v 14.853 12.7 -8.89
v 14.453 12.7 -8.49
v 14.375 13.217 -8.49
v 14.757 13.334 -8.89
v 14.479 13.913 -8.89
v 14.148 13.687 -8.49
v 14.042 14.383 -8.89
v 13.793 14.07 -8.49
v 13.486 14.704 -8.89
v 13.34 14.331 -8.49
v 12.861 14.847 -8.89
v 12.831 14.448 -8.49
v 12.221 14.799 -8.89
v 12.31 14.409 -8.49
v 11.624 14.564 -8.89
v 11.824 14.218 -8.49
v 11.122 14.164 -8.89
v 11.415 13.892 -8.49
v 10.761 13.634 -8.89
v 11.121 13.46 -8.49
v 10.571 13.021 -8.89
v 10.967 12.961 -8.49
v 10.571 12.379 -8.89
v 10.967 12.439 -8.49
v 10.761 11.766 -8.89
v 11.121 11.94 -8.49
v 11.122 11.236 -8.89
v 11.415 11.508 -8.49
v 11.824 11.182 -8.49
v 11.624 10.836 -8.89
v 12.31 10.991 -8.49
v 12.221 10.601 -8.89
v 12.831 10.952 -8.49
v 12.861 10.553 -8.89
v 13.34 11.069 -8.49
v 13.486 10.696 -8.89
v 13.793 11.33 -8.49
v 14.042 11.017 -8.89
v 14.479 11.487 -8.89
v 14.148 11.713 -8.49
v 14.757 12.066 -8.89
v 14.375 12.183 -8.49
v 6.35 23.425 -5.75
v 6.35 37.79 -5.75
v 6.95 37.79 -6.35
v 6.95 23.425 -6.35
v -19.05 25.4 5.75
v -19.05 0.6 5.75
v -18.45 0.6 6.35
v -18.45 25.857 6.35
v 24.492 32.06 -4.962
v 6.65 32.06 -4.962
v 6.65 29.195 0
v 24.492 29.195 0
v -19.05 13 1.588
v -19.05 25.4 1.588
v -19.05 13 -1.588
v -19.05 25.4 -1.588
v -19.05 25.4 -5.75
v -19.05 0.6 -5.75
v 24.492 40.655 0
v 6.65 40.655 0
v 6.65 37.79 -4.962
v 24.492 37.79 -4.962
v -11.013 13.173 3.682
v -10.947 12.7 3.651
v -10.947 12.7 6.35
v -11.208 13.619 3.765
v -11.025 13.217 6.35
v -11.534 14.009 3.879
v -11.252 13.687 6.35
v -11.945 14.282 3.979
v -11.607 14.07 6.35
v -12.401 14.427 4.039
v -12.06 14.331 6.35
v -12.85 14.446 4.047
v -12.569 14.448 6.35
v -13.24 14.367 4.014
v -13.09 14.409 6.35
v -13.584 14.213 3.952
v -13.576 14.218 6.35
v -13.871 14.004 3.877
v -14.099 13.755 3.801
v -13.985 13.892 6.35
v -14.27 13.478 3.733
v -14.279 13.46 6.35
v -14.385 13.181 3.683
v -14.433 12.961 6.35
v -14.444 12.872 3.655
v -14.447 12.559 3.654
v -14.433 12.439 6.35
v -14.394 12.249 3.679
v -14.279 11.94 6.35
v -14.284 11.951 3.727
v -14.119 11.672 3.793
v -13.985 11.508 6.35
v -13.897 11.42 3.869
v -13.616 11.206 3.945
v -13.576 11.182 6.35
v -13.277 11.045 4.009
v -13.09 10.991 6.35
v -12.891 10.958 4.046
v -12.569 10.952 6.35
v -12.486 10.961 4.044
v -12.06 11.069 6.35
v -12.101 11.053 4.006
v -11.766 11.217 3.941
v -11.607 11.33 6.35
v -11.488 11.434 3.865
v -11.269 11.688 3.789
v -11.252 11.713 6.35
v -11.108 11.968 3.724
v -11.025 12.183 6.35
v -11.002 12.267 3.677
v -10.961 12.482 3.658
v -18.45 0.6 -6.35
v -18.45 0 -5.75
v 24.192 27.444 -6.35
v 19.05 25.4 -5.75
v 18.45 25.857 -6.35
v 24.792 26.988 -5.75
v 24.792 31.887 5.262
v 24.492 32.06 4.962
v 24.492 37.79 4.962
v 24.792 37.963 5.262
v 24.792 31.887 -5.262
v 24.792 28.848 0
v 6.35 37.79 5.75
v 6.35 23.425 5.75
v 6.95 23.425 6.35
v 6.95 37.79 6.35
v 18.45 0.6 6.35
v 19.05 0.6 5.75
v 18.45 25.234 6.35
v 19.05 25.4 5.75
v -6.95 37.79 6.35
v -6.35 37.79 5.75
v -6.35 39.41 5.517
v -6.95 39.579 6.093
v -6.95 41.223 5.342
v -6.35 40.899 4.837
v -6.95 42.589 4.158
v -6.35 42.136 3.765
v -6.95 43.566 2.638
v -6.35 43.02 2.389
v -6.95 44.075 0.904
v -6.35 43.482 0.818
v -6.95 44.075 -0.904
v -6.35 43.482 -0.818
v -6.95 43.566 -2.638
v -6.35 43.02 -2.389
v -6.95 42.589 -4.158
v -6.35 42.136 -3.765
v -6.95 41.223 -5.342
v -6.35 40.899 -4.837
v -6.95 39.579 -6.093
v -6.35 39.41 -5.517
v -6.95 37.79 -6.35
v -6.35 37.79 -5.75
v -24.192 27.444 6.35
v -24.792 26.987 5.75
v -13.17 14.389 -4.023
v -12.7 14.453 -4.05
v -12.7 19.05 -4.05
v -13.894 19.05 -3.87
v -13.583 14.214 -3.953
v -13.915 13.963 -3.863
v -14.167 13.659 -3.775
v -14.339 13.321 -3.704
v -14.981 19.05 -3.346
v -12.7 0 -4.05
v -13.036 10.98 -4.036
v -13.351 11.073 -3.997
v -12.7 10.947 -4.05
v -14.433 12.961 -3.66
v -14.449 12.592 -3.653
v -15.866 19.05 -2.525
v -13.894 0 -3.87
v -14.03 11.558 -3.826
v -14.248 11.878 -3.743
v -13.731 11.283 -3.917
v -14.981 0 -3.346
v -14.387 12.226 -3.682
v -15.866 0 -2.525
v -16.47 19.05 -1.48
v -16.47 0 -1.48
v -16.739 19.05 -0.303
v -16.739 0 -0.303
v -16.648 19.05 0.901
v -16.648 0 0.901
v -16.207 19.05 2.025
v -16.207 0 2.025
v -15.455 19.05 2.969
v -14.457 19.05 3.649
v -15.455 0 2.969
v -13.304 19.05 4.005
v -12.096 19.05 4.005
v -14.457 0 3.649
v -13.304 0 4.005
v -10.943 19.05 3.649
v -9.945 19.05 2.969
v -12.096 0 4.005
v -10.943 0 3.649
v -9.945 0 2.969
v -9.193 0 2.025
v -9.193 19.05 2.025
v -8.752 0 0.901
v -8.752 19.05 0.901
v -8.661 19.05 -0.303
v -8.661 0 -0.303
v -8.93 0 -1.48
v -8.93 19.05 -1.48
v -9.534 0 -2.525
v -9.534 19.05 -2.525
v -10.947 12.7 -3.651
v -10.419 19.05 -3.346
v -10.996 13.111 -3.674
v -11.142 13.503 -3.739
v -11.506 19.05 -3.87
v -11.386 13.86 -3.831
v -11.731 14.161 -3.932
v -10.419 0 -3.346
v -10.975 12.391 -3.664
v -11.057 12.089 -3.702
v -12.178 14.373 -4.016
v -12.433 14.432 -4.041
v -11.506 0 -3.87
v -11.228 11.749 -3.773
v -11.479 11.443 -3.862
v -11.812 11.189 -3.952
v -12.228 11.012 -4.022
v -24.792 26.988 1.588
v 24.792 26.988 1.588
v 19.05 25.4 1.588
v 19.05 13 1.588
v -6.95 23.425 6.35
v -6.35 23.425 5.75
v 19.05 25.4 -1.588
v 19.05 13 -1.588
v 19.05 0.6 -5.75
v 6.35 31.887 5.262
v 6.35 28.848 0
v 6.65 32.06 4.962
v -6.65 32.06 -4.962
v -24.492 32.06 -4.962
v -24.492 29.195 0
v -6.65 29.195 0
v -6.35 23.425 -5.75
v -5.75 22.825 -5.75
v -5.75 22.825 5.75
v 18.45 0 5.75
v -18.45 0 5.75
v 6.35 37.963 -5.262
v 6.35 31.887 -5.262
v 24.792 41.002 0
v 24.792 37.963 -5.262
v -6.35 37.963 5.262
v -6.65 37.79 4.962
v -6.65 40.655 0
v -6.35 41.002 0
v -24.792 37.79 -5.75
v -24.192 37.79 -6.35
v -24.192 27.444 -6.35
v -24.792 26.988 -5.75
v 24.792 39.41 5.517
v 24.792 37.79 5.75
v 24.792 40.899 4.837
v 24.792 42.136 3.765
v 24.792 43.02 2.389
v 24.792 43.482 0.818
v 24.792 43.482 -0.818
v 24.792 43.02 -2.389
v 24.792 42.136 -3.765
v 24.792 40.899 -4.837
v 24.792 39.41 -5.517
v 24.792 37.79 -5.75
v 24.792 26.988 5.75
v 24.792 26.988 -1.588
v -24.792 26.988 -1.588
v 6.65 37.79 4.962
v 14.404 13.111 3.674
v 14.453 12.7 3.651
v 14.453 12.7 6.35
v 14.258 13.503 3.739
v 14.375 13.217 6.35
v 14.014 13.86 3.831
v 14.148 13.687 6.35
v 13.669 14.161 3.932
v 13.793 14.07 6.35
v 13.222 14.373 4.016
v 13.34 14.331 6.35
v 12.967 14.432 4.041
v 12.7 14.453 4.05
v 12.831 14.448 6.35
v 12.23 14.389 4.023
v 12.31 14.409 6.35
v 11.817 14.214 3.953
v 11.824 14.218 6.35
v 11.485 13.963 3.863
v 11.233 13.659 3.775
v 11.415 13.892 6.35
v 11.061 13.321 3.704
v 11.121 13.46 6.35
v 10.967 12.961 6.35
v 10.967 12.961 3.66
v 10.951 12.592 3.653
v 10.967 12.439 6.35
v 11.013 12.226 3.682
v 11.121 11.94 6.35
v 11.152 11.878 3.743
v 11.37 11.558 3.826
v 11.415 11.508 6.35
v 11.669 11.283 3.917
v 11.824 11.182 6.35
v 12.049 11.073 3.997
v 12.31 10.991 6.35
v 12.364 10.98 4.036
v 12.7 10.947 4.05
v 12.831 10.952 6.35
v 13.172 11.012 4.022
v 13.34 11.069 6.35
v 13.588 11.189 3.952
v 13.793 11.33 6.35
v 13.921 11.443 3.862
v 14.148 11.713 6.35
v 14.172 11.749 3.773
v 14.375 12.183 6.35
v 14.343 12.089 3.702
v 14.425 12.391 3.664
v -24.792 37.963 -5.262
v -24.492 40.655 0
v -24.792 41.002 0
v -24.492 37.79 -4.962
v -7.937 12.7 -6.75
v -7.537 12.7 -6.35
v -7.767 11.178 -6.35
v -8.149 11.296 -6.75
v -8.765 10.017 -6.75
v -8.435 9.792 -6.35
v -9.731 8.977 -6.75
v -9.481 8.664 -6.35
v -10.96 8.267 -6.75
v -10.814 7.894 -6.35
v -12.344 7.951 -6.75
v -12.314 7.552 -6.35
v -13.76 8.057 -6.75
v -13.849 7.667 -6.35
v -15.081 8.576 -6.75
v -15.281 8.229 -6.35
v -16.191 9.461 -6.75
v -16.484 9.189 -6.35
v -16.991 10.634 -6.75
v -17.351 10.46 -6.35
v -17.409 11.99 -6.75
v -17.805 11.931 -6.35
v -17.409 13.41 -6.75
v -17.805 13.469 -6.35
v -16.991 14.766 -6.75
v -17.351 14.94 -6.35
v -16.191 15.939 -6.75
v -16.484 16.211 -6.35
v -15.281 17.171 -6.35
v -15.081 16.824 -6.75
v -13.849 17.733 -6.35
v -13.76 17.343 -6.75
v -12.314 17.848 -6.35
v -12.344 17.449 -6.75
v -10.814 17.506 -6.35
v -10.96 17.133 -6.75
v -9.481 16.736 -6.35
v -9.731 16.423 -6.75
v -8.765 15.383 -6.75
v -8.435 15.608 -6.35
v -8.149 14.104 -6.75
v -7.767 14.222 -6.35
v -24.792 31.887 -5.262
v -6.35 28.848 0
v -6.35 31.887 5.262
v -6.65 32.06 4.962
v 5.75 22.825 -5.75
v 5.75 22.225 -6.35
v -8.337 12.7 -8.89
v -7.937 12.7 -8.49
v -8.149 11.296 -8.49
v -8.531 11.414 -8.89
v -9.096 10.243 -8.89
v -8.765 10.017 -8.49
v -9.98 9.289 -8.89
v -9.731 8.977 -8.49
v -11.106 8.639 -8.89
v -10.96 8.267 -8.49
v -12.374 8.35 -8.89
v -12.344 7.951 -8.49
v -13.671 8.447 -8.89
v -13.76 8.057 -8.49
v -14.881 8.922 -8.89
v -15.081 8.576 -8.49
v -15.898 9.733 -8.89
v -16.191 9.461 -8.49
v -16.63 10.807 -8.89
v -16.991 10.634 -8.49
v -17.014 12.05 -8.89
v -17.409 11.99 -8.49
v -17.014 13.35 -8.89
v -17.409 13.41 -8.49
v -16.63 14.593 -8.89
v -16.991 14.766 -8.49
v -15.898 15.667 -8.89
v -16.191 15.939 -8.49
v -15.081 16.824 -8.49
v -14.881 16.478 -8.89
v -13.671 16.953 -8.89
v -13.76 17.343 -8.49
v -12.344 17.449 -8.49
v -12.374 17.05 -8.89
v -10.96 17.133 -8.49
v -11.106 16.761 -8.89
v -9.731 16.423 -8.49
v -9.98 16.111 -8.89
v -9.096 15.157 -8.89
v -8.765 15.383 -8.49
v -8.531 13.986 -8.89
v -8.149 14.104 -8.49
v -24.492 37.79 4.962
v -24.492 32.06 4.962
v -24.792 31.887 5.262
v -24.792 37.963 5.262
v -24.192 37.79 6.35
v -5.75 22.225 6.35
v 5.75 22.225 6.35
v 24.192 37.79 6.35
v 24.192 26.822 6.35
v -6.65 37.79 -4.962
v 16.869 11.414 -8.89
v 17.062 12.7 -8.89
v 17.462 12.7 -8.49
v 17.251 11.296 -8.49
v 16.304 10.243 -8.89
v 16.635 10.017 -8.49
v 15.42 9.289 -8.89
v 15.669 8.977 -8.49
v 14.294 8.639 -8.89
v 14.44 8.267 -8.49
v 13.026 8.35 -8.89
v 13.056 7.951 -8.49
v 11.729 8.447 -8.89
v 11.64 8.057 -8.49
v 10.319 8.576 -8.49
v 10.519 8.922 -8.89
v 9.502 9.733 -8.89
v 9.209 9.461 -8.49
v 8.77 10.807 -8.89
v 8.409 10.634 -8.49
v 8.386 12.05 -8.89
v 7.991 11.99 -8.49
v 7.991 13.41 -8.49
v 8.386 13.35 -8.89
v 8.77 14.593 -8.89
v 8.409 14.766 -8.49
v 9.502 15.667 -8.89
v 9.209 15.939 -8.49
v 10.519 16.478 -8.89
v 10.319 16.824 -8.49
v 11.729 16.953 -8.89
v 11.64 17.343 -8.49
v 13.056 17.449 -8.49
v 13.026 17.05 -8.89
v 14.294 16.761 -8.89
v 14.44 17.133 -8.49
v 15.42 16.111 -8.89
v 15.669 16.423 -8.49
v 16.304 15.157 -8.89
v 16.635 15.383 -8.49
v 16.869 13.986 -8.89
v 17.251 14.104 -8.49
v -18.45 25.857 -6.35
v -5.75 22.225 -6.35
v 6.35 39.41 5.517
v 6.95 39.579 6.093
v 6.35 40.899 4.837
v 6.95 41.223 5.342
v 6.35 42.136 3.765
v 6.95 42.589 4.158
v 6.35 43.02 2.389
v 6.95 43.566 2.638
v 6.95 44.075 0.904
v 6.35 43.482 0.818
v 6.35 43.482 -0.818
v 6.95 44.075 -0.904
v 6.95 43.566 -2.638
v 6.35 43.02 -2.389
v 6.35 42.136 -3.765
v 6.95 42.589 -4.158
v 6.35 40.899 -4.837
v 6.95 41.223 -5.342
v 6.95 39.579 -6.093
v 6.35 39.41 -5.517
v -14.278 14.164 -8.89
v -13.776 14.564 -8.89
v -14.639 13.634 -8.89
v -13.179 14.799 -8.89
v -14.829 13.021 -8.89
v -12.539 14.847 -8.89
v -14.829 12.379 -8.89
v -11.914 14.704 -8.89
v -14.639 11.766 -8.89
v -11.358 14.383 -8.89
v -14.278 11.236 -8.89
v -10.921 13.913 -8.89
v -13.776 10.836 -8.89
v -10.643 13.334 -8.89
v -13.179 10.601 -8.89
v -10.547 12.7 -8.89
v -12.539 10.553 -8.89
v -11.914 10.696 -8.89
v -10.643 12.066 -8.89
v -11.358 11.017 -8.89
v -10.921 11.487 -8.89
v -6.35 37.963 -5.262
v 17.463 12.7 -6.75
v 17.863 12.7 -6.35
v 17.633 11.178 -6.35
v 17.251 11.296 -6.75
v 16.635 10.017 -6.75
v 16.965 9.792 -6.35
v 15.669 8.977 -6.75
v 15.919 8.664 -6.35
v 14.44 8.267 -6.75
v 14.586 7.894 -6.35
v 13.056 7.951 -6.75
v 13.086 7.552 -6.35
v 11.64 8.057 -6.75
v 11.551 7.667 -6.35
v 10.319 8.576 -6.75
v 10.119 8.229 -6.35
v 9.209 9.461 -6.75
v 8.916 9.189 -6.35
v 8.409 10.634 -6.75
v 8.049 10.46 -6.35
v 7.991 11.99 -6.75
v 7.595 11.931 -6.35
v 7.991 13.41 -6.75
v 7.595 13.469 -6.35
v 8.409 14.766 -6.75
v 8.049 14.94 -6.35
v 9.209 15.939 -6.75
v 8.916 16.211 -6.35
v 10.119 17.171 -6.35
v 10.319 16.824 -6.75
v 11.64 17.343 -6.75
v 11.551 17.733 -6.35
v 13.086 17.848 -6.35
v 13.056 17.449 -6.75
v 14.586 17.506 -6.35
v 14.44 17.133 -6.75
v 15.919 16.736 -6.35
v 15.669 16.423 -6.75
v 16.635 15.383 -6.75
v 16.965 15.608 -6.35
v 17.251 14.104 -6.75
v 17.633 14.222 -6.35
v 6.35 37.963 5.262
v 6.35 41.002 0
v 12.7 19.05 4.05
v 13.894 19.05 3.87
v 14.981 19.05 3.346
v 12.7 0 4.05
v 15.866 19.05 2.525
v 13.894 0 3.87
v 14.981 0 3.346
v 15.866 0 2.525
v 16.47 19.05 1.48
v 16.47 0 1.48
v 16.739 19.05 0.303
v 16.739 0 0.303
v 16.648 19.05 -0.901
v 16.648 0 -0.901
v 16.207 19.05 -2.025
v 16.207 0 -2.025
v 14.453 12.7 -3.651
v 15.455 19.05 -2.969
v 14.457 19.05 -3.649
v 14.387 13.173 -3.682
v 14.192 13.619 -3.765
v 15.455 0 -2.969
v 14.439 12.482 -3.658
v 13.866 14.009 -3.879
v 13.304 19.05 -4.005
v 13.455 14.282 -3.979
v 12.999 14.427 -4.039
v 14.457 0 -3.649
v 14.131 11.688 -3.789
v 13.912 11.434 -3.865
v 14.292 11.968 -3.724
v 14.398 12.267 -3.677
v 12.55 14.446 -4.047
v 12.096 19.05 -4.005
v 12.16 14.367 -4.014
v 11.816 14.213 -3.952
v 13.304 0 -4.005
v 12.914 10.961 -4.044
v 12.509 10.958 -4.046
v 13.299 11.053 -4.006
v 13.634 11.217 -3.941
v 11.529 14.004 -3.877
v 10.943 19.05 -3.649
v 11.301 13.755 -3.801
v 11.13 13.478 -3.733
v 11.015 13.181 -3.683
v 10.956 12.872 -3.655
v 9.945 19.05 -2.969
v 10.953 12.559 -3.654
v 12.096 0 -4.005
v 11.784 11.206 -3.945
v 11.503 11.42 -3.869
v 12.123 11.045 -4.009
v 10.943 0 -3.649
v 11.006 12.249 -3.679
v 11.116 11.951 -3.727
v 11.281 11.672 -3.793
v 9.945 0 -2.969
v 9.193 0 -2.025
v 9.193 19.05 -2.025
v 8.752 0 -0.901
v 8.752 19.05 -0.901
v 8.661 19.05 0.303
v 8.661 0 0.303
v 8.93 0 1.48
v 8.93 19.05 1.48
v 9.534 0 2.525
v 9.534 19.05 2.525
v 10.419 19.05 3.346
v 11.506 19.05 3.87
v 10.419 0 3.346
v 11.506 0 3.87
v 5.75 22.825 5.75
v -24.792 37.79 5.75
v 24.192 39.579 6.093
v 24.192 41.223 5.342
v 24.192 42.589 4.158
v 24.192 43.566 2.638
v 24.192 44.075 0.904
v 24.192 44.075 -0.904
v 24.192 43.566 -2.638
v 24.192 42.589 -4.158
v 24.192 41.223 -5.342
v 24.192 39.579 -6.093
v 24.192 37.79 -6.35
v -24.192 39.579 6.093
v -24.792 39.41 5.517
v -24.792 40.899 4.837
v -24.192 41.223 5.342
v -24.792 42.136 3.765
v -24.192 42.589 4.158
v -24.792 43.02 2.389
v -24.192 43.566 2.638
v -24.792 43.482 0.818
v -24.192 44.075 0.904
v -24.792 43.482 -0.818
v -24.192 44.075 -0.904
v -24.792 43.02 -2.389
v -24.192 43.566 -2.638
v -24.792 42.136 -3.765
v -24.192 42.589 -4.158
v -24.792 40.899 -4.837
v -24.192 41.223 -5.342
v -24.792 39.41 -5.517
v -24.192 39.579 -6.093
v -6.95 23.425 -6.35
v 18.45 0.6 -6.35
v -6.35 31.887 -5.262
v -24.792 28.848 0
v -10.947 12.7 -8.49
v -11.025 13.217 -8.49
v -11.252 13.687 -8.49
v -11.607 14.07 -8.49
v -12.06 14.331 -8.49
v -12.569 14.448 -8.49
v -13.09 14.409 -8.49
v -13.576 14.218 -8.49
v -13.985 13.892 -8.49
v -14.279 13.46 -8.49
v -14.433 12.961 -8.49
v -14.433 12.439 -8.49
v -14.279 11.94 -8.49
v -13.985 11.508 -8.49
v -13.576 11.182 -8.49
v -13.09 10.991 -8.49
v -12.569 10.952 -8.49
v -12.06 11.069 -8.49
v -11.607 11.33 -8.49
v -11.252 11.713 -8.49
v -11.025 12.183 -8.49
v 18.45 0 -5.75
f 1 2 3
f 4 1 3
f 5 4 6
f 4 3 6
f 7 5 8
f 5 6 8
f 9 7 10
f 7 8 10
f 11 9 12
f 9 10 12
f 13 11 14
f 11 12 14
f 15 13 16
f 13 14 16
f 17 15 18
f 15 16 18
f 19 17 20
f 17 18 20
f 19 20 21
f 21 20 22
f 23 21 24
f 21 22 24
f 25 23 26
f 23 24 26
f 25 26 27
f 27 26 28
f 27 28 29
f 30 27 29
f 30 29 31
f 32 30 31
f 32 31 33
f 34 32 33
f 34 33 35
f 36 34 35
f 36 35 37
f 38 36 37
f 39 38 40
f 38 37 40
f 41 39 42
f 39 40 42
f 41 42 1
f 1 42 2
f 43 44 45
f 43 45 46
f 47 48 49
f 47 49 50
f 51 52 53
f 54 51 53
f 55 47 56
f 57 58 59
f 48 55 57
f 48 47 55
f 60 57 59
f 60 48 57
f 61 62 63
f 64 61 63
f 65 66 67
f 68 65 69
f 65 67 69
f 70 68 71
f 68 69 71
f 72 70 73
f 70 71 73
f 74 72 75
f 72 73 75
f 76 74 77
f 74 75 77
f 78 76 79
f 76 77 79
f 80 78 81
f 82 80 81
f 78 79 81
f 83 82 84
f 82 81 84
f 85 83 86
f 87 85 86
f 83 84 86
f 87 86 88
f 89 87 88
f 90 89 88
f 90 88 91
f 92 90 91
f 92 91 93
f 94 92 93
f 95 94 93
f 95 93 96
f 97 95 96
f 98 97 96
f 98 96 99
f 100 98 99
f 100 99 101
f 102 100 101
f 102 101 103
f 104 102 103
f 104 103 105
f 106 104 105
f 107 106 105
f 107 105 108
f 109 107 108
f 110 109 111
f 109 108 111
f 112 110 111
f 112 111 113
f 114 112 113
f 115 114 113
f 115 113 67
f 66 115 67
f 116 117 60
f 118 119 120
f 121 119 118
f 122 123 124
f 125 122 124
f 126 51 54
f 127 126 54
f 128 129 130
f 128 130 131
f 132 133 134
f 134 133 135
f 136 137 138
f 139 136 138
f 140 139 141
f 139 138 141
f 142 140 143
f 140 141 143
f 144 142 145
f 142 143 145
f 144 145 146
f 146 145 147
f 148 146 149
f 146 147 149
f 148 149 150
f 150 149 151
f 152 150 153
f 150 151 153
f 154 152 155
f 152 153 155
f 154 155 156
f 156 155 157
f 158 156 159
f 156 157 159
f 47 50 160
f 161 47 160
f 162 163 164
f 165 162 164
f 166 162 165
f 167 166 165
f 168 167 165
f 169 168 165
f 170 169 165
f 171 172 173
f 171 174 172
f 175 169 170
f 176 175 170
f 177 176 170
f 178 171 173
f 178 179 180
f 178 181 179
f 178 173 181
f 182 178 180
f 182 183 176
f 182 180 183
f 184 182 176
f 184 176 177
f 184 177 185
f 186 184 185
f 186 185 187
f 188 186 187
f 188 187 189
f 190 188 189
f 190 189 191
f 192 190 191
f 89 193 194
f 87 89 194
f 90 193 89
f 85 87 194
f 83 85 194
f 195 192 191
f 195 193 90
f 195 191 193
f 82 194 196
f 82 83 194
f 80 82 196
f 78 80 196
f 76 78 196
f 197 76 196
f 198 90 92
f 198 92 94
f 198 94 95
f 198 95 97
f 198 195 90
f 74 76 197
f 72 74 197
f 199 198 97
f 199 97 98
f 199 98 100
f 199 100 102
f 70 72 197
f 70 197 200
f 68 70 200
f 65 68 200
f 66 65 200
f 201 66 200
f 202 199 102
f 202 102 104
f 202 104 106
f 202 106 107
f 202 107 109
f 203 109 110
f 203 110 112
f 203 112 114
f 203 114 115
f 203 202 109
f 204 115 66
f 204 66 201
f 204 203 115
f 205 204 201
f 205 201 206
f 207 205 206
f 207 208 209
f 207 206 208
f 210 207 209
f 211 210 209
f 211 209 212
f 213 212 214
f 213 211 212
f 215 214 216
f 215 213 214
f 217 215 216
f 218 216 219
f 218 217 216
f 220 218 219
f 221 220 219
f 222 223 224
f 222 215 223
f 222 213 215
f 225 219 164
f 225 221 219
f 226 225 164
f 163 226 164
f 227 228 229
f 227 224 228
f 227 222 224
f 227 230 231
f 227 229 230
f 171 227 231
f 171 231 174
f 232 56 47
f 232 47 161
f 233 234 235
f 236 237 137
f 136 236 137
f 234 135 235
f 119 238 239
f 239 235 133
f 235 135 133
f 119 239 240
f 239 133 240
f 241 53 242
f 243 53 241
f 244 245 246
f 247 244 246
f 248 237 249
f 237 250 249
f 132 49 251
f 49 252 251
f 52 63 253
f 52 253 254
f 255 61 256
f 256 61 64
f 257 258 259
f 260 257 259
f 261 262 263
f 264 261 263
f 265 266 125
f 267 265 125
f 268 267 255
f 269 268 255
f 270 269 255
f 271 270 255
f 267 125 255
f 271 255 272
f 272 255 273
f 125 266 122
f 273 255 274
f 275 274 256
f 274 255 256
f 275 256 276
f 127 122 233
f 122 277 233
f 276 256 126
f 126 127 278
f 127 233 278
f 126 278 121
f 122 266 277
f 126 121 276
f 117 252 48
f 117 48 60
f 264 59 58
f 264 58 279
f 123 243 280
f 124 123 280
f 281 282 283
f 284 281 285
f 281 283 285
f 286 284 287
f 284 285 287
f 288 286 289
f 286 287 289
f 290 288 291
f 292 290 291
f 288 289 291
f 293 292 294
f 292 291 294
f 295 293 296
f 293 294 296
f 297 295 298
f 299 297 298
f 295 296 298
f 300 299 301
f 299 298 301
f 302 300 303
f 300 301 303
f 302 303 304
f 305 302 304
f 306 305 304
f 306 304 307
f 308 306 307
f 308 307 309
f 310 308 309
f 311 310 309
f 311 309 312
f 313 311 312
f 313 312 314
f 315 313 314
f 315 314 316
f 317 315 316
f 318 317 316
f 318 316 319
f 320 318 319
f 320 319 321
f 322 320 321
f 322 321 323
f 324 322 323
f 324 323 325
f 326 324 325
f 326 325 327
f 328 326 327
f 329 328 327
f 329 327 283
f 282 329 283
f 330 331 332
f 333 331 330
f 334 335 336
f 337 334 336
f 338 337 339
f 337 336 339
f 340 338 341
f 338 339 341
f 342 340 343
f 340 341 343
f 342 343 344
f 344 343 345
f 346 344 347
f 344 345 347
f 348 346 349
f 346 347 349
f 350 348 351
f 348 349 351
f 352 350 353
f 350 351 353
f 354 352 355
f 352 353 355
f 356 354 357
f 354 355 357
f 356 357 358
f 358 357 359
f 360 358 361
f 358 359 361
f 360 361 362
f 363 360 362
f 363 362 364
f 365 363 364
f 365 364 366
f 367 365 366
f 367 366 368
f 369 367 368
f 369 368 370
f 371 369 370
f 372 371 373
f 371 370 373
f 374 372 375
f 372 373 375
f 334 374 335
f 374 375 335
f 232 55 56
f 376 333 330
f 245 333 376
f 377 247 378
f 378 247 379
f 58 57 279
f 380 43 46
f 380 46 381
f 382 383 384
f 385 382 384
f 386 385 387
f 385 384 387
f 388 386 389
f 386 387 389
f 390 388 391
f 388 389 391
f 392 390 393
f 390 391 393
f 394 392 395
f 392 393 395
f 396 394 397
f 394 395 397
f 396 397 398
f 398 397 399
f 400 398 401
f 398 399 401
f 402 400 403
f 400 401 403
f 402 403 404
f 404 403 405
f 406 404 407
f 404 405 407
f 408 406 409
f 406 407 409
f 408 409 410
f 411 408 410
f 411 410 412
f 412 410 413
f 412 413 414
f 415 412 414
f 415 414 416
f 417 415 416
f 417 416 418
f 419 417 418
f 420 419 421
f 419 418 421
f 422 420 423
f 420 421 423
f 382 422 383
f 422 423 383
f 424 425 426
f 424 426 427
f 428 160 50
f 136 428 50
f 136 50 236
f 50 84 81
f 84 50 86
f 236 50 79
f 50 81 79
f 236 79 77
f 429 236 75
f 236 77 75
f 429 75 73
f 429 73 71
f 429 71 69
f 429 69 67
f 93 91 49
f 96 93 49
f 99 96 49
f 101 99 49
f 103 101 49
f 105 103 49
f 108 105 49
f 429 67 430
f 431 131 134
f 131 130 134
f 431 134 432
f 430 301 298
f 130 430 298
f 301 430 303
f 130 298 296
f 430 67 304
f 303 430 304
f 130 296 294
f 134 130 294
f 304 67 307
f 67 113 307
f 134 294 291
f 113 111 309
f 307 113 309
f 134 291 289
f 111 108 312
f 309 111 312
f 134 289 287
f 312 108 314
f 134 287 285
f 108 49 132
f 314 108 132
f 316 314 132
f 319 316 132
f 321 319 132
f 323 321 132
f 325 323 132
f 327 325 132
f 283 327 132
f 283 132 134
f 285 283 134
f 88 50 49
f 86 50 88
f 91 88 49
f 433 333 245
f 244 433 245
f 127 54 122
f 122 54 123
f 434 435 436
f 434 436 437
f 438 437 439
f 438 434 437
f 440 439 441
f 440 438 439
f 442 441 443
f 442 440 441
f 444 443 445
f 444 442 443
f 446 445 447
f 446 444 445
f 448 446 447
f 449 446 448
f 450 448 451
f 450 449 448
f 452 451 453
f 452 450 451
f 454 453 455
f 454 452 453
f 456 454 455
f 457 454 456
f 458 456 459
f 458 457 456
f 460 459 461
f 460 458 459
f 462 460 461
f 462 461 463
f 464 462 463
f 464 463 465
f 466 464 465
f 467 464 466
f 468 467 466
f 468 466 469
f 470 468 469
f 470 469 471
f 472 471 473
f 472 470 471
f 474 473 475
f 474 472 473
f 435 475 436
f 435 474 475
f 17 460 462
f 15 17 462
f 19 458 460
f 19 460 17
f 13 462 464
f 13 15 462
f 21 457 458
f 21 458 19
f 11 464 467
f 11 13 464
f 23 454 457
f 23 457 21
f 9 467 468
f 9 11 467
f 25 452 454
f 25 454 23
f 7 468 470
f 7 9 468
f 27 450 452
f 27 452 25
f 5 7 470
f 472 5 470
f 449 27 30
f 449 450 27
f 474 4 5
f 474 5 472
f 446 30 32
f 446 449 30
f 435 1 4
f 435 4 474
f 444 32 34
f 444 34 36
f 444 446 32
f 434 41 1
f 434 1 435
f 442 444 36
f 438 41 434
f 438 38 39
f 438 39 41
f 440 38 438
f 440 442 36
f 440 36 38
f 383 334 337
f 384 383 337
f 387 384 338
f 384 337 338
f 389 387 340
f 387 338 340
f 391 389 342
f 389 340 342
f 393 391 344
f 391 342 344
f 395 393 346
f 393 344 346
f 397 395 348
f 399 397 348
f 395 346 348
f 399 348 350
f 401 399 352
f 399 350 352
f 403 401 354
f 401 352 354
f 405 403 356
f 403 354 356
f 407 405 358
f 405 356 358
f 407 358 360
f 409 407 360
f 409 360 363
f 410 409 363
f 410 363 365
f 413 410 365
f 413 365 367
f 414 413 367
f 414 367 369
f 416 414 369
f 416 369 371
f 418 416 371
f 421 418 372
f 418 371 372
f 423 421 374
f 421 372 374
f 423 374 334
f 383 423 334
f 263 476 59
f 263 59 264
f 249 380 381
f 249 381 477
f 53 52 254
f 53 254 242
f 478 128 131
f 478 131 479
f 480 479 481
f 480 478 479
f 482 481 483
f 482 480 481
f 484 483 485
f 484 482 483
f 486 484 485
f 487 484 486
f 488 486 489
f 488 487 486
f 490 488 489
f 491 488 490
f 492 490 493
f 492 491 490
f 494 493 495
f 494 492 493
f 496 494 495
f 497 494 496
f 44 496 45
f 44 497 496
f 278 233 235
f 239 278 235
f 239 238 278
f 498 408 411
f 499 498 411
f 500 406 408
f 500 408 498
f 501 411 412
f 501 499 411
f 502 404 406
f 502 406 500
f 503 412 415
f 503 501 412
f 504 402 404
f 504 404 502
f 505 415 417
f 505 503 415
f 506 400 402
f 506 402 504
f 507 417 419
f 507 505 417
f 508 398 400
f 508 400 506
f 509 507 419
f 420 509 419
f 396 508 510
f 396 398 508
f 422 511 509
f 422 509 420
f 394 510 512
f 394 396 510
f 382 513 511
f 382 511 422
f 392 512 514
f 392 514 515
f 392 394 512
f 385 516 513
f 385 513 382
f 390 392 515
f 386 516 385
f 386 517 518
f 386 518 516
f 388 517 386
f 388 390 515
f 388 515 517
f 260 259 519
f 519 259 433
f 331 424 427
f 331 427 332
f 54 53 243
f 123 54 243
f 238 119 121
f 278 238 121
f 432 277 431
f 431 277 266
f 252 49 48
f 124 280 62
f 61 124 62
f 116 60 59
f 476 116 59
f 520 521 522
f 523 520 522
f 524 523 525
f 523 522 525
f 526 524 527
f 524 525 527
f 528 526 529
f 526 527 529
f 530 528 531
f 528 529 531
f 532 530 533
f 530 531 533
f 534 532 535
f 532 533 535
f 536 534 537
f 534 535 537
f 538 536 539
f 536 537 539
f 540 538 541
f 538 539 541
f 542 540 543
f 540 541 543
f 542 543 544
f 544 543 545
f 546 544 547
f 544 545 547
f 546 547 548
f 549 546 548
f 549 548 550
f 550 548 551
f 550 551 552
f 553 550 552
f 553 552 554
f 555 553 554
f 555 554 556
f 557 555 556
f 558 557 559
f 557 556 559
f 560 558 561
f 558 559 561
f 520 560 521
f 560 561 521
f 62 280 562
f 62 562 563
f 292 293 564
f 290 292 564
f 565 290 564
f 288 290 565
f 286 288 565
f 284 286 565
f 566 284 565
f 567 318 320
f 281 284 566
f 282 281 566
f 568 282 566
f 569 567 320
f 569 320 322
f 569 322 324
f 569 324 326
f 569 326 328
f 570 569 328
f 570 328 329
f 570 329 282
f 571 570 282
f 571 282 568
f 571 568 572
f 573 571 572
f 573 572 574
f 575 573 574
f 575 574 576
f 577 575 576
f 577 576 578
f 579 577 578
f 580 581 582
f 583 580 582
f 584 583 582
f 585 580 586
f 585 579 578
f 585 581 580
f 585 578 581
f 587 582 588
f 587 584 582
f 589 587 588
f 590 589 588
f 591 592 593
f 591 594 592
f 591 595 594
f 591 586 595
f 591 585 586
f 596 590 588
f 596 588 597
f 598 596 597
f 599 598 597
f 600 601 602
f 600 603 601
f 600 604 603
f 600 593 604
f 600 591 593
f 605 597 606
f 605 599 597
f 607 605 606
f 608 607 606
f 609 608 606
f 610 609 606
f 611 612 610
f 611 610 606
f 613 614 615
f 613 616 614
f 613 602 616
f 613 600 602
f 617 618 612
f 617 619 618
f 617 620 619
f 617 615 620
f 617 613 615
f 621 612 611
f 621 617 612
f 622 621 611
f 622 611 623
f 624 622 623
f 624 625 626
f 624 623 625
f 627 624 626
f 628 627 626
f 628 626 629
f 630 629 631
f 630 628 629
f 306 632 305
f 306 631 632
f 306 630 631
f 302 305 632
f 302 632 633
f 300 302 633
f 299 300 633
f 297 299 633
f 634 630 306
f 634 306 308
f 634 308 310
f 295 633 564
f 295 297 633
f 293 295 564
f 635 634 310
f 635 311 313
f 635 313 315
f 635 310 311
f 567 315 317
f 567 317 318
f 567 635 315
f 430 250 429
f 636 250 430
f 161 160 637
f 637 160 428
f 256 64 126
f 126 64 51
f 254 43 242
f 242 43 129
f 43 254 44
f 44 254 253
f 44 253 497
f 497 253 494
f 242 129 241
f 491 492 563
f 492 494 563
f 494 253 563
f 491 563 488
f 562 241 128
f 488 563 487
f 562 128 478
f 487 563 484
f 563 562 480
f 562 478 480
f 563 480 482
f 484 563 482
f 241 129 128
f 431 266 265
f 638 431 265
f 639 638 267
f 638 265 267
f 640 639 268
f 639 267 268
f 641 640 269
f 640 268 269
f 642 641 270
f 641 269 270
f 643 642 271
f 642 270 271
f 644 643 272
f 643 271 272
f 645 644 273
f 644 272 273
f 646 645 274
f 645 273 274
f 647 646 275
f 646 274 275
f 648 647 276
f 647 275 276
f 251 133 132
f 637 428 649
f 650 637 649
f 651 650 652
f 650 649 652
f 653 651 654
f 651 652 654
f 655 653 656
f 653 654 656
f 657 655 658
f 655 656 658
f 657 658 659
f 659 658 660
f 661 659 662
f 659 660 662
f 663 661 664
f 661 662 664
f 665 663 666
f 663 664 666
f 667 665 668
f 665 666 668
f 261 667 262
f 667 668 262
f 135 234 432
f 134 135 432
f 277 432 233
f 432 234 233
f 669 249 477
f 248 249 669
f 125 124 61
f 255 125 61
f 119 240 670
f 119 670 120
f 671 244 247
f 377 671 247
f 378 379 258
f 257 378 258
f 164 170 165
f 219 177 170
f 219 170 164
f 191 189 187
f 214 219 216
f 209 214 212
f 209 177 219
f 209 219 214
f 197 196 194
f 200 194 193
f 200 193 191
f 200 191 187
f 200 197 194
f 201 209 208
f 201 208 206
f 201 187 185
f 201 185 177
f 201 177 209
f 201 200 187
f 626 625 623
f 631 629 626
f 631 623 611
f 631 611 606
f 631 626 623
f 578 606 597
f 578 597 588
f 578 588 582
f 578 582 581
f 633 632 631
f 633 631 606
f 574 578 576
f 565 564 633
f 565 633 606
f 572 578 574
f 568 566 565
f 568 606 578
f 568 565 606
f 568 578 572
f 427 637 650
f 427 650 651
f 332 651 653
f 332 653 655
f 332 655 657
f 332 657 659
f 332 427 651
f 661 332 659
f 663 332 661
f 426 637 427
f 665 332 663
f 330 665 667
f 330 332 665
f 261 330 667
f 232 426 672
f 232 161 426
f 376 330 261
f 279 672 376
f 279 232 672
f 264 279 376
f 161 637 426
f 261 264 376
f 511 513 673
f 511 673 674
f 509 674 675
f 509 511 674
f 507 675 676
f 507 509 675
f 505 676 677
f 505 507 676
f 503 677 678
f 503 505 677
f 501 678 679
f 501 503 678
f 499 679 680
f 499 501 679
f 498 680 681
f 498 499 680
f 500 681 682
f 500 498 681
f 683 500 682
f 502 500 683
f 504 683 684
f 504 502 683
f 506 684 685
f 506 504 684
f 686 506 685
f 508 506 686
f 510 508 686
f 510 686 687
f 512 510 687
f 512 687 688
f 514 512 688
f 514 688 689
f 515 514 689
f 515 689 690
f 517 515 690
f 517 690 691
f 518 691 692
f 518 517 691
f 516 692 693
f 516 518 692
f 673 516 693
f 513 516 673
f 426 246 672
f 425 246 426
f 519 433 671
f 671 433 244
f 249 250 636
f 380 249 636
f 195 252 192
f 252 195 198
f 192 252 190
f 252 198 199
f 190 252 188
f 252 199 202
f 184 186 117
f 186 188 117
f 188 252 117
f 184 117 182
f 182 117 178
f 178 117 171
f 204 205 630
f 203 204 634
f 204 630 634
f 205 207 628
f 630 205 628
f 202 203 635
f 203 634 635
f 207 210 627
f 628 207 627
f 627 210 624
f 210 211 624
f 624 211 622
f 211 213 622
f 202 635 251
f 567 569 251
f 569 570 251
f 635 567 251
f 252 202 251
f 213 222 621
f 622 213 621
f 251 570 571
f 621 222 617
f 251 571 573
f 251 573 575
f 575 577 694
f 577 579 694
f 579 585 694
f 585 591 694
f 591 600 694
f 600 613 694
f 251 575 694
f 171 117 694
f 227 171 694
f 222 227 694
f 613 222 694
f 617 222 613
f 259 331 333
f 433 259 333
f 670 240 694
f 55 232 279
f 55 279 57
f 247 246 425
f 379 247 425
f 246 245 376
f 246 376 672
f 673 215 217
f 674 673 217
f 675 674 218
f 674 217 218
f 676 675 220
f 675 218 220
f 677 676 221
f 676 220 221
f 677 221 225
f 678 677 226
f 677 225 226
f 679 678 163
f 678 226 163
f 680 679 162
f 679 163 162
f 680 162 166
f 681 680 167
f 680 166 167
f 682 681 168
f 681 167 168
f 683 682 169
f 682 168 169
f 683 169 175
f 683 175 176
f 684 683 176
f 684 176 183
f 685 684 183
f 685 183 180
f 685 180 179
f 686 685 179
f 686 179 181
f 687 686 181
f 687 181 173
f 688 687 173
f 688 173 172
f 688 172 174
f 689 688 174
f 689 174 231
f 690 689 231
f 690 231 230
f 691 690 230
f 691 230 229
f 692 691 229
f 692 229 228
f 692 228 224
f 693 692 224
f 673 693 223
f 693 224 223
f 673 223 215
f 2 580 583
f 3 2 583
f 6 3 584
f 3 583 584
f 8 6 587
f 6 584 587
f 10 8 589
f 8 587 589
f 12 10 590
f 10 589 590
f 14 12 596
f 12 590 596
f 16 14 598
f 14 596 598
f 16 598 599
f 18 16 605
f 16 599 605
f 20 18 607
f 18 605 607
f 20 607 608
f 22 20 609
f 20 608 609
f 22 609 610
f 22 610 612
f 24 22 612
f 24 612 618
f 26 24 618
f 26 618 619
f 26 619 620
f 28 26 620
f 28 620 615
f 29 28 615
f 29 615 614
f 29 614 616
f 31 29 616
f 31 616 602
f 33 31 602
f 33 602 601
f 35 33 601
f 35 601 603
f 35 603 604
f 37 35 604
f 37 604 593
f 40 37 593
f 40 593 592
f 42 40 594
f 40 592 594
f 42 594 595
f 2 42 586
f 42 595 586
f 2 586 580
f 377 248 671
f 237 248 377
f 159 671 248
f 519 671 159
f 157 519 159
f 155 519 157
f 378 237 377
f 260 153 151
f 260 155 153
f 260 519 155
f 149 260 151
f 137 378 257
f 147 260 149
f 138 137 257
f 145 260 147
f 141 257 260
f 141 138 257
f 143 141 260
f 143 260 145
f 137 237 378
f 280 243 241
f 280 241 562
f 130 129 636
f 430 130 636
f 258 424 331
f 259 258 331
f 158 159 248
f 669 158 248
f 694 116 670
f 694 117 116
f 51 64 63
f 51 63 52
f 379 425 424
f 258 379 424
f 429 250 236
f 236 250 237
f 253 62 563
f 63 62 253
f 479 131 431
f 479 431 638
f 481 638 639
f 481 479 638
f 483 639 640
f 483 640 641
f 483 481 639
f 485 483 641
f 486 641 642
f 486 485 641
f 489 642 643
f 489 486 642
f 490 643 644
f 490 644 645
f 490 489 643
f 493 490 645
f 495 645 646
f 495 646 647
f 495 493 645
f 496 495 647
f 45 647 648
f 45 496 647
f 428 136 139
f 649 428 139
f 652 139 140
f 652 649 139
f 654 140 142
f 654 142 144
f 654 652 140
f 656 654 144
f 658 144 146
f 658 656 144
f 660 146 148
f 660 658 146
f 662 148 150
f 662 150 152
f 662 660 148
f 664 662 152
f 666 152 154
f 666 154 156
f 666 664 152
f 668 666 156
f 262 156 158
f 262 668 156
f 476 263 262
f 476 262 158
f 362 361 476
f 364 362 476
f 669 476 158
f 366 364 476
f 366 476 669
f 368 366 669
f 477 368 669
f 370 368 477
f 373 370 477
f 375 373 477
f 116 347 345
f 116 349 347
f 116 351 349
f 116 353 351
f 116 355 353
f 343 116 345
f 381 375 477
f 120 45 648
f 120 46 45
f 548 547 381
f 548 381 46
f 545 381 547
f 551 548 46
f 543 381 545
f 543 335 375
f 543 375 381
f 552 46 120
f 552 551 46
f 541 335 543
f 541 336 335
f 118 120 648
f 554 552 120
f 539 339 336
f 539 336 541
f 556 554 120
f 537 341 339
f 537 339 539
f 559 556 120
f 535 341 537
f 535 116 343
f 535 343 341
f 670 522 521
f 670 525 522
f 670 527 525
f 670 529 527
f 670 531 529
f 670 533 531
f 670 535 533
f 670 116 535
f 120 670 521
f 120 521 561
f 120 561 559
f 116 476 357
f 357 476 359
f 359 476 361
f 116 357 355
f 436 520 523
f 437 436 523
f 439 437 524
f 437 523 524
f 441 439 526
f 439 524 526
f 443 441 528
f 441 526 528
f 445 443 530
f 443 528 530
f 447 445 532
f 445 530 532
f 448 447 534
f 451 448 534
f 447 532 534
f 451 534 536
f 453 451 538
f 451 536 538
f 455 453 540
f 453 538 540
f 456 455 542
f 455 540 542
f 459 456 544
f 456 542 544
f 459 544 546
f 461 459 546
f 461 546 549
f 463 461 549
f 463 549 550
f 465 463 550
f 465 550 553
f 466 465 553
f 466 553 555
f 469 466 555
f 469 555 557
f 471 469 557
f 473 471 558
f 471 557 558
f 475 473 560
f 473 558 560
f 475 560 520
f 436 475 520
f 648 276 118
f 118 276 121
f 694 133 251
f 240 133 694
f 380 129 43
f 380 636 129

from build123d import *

# Parameters (mm, degrees)
SKETCH1_W                = 38.1
SKETCH1_H                = 12.7
SKETCH1_R                = 4.05
BOSS_EXTRUDE1_DEPTH      = 25.4
SKETCH5_R                = 1.7526
CUT_EXTRUDE2_DEPTH       = 35.195796525
SKETCH6_W                = 49.584
SKETCH6_H                = 12.7
BOSS_EXTRUDE4_DEPTH      = 19.05
CUT_EXTRUDE3_DEPTH       = 67.893183937
CUT_EXTRUDE4_DEPTH       = 67.893183937
CUT_EXTRUDE5_DEPTH       = 53.194652565
CHAMFER1_SIZE            = 0.6
SKETCH10_W               = 12.7
SKETCH10_H               = 25.4
CUT_EXTRUDE6_DEPTH       = 53.194652565
CHAMFER2_SIZE            = 0.6
CHAMFER3_SIZE            = 0.3
BOSS_EXTRUDE5_DEPTH      = 1.5875
BOSS_EXTRUDE5_DEPTH_BACK = 1.5875
SKETCH14_R               = 4.7625
BOSS_EXTRUDE6_DEPTH      = 2.54
SKETCH15_R               = 1.7526
CUT_EXTRUDE7_DEPTH       = 53.870117777
CHAMFER4_SIZE            = 0.4
SKETCH18_R               = 4.1
BOSS_EXTRUDE7_DEPTH      = 6.35


with BuildPart() as part:
    # Sketch1 → Boss-Extrude1 (new body)
    with BuildSketch(Plane(origin=(0, 0, 0), x_dir=(1, 0, 0), z_dir=(0, 1, 0))):
        Rectangle(SKETCH1_W, SKETCH1_H)
        with Locations(Location((12.7, 0, 0), (0, 0, 270))):
            Circle(SKETCH1_R, mode=Mode.SUBTRACT)
        with Locations(Location((-12.7, 0, 0), (0, 0, 90))):
            Circle(SKETCH1_R, mode=Mode.SUBTRACT)
    extrude(amount=BOSS_EXTRUDE1_DEPTH)

    # Sketch5 → Cut-Extrude2 (cut, through all)
    with BuildSketch(Plane.XY.offset(6.35)):
        with Locations((12.7, 12.7)):
            Circle(SKETCH5_R)
        with Locations((-12.7, 12.7)):
            Circle(SKETCH5_R)
    extrude(amount=-CUT_EXTRUDE2_DEPTH, mode=Mode.SUBTRACT)

    # Sketch6 → Boss-Extrude4 (add)
    with BuildSketch(Plane(origin=(0, 25.4, 0), x_dir=(1, 0, 0), z_dir=(0, 1, 0))):
        Rectangle(SKETCH6_W, SKETCH6_H)
    extrude(amount=BOSS_EXTRUDE4_DEPTH)

    # Sketch7 → Cut-Extrude3 (cut, through all)
    with BuildSketch(Plane.ZY.offset(24.792)):
        Polygon((0, 40.6552014), (-4.962499981, 37.7901007), (-4.962499981, 32.0598993), (0, 29.1947986), (4.962499981, 32.0598993), (4.962499981, 37.7901007), align=None)
    extrude(amount=-CUT_EXTRUDE3_DEPTH, mode=Mode.SUBTRACT)

    # Sketch8 → Cut-Extrude4 (cut, through all)
    with BuildSketch(Plane.ZY.offset(24.792)):
        with BuildLine():
            Line((-6.35, 37.7901007), (-6.35, 44.45))
            Line((-6.35, 44.45), (6.35, 44.45))
            Line((6.35, 44.45), (6.35, 37.7901007))
            ThreePointArc((6.35, 37.7901007), (0, 44.1401007), (-6.35, 37.7901007))
        make_face()
    extrude(amount=-CUT_EXTRUDE4_DEPTH, mode=Mode.SUBTRACT)

    # Sketch9 → Cut-Extrude5 (cut, through all)
    with BuildSketch(Plane(origin=(0, 0, -6.35), x_dir=(-1, 0, 0), z_dir=(0, 0, -1))):
        Polygon((19.05, 25.4), (24.792, 26.9875), (24.792, 25.4), align=None)
        Polygon((-24.792, 25.4), (-19.05, 25.4), (-24.792, 26.9875), align=None)
    extrude(amount=-CUT_EXTRUDE5_DEPTH, mode=Mode.SUBTRACT)

    # Chamfer1
    chamfer1_edges = [part.edges().sort_by_distance(p)[0] for p in [
        (19.05, 0, 0),
        (24.792, 32.38880035, 6.35),
        (24.792, 44.1401007, 0),
        (24.792, 32.38880035, -6.35),
        (21.921, 26.19375, -6.35),
        (19.05, 12.7, -6.35),
        (19.05, 12.7, 6.35),
        (-21.921, 26.19375, 6.35),
        (-24.792, 32.38880035, 6.35),
        (-24.792, 44.1401007, 0),
        (-24.792, 32.38880035, -6.35),
        (-21.921, 26.19375, -6.35),
        (0, 0, 6.35),
        (0, 0, -6.35),
        (-19.05, 12.7, 6.35),
        (-19.05, 0, 0),
        (-19.05, 12.7, -6.35),
    ]]
    chamfer(chamfer1_edges, length=CHAMFER1_SIZE)

    # Sketch10 → Cut-Extrude6 (cut, through all)
    with BuildSketch(Plane.XY.offset(6.35)):
        with Locations((0, 35.525)):
            Rectangle(SKETCH10_W, SKETCH10_H)
    extrude(amount=-CUT_EXTRUDE6_DEPTH, mode=Mode.SUBTRACT)

    # Chamfer2
    chamfer2_edges = [part.edges().sort_by_distance(p)[0] for p in [
        (-6.35, 44.1401007, 0),
        (6.35, 44.1401007, 0),
        (6.35, 30.30755035, -6.35),
        (-6.35, 30.30755035, -6.35),
        (-6.35, 22.825, 0),
        (6.35, 30.30755035, 6.35),
        (-6.35, 30.30755035, 6.35),
        (0, 22.825, 6.35),
        (0, 22.825, -6.35),
        (6.35, 22.825, 0),
    ]]
    chamfer(chamfer2_edges, length=CHAMFER2_SIZE)

    # Chamfer3
    chamfer3_edges = [part.edges().sort_by_distance(p)[0] for p in [
        (6.35, 34.925, 4.962499981),
        (6.35, 39.22265105, 2.481249991),
        (6.35, 39.22265105, -2.48124999),
        (6.35, 34.925, -4.962499981),
        (6.35, 30.62734895, -2.48124999),
        (6.35, 30.62734895, 2.481249991),
        (-6.35, 39.22265105, -2.48124999),
        (-6.35, 39.22265105, 2.481249991),
        (-6.35, 34.925, 4.962499981),
        (-6.35, 30.62734895, 2.481249991),
        (-6.35, 30.62734895, -2.48124999),
        (-6.35, 34.925, -4.962499981),
        (24.792, 39.22265105, 2.481249991),
        (24.792, 34.925, 4.962499981),
        (24.792, 30.62734895, 2.481249991),
        (24.792, 30.62734895, -2.48124999),
        (24.792, 34.925, -4.962499981),
        (24.792, 39.22265105, -2.481249991),
        (-24.792, 39.22265105, 2.481249991),
        (-24.792, 39.22265105, -2.48124999),
        (-24.792, 34.925, -4.962499981),
        (-24.792, 30.62734895, -2.48124999),
        (-24.792, 30.62734895, 2.481249991),
        (-24.792, 34.925, 4.962499981),
    ]]
    chamfer(chamfer3_edges, length=CHAMFER3_SIZE)

    # Sketch13 → Boss-Extrude5 (add, two sides: drawn at the far end of the back side and taken through both)
    with BuildSketch(Plane(origin=(0, 0, 0), x_dir=(0, -1, 0), z_dir=(0, 0, -1)).offset(-BOSS_EXTRUDE5_DEPTH_BACK)):
        Polygon((-25.4, 19.05), (-26.9875, 24.792), (-13, 19.05), align=None)
        Polygon((-26.9875, -24.792), (-13, -19.05), (-25.4, -19.05), align=None)
    extrude(amount=BOSS_EXTRUDE5_DEPTH + BOSS_EXTRUDE5_DEPTH_BACK)

    # Sketch14 → Boss-Extrude6 (add)
    with BuildSketch(Plane(origin=(0, 0, -6.35), x_dir=(-1, 0, 0), z_dir=(0, 0, -1))):
        with Locations(Location((-12.7, 12.7, 0), (0, 0, 180))):
            Circle(SKETCH14_R)
        with Locations(Location((12.7, 12.7, 0), (0, 0, 180))):
            Circle(SKETCH14_R)
    extrude(amount=BOSS_EXTRUDE6_DEPTH)

    # Sketch15 → Cut-Extrude7 (cut, through all)
    with BuildSketch(Plane.XY.offset(6.35)):
        with Locations((12.7, 12.7)):
            Circle(SKETCH15_R)
        with Locations((-12.7, 12.7)):
            Circle(SKETCH15_R)
    extrude(amount=-CUT_EXTRUDE7_DEPTH, mode=Mode.SUBTRACT)

    # Chamfer4
    chamfer4_edges = [part.edges().sort_by_distance(p)[0] for p in [
        (7.9375, 12.7, -6.35),
        (7.9375, 12.7, -8.89),
        (-17.4625, 12.7, -6.35),
        (-17.4625, 12.7, -8.89),
        (10.9474, 12.7, -8.89),
        (-14.4526, 12.7, -8.89),
    ]]
    chamfer(chamfer4_edges, length=CHAMFER4_SIZE)

    # Sketch18 → Boss-Extrude7 (add)
    with BuildSketch(Plane.XZ.offset(-25.4)):
        with Locations((-12.7, 0)):
            Circle(SKETCH18_R)
        with Locations((12.7, 0)):
            Circle(SKETCH18_R)
    extrude(amount=BOSS_EXTRUDE7_DEPTH)


solid = part.part
